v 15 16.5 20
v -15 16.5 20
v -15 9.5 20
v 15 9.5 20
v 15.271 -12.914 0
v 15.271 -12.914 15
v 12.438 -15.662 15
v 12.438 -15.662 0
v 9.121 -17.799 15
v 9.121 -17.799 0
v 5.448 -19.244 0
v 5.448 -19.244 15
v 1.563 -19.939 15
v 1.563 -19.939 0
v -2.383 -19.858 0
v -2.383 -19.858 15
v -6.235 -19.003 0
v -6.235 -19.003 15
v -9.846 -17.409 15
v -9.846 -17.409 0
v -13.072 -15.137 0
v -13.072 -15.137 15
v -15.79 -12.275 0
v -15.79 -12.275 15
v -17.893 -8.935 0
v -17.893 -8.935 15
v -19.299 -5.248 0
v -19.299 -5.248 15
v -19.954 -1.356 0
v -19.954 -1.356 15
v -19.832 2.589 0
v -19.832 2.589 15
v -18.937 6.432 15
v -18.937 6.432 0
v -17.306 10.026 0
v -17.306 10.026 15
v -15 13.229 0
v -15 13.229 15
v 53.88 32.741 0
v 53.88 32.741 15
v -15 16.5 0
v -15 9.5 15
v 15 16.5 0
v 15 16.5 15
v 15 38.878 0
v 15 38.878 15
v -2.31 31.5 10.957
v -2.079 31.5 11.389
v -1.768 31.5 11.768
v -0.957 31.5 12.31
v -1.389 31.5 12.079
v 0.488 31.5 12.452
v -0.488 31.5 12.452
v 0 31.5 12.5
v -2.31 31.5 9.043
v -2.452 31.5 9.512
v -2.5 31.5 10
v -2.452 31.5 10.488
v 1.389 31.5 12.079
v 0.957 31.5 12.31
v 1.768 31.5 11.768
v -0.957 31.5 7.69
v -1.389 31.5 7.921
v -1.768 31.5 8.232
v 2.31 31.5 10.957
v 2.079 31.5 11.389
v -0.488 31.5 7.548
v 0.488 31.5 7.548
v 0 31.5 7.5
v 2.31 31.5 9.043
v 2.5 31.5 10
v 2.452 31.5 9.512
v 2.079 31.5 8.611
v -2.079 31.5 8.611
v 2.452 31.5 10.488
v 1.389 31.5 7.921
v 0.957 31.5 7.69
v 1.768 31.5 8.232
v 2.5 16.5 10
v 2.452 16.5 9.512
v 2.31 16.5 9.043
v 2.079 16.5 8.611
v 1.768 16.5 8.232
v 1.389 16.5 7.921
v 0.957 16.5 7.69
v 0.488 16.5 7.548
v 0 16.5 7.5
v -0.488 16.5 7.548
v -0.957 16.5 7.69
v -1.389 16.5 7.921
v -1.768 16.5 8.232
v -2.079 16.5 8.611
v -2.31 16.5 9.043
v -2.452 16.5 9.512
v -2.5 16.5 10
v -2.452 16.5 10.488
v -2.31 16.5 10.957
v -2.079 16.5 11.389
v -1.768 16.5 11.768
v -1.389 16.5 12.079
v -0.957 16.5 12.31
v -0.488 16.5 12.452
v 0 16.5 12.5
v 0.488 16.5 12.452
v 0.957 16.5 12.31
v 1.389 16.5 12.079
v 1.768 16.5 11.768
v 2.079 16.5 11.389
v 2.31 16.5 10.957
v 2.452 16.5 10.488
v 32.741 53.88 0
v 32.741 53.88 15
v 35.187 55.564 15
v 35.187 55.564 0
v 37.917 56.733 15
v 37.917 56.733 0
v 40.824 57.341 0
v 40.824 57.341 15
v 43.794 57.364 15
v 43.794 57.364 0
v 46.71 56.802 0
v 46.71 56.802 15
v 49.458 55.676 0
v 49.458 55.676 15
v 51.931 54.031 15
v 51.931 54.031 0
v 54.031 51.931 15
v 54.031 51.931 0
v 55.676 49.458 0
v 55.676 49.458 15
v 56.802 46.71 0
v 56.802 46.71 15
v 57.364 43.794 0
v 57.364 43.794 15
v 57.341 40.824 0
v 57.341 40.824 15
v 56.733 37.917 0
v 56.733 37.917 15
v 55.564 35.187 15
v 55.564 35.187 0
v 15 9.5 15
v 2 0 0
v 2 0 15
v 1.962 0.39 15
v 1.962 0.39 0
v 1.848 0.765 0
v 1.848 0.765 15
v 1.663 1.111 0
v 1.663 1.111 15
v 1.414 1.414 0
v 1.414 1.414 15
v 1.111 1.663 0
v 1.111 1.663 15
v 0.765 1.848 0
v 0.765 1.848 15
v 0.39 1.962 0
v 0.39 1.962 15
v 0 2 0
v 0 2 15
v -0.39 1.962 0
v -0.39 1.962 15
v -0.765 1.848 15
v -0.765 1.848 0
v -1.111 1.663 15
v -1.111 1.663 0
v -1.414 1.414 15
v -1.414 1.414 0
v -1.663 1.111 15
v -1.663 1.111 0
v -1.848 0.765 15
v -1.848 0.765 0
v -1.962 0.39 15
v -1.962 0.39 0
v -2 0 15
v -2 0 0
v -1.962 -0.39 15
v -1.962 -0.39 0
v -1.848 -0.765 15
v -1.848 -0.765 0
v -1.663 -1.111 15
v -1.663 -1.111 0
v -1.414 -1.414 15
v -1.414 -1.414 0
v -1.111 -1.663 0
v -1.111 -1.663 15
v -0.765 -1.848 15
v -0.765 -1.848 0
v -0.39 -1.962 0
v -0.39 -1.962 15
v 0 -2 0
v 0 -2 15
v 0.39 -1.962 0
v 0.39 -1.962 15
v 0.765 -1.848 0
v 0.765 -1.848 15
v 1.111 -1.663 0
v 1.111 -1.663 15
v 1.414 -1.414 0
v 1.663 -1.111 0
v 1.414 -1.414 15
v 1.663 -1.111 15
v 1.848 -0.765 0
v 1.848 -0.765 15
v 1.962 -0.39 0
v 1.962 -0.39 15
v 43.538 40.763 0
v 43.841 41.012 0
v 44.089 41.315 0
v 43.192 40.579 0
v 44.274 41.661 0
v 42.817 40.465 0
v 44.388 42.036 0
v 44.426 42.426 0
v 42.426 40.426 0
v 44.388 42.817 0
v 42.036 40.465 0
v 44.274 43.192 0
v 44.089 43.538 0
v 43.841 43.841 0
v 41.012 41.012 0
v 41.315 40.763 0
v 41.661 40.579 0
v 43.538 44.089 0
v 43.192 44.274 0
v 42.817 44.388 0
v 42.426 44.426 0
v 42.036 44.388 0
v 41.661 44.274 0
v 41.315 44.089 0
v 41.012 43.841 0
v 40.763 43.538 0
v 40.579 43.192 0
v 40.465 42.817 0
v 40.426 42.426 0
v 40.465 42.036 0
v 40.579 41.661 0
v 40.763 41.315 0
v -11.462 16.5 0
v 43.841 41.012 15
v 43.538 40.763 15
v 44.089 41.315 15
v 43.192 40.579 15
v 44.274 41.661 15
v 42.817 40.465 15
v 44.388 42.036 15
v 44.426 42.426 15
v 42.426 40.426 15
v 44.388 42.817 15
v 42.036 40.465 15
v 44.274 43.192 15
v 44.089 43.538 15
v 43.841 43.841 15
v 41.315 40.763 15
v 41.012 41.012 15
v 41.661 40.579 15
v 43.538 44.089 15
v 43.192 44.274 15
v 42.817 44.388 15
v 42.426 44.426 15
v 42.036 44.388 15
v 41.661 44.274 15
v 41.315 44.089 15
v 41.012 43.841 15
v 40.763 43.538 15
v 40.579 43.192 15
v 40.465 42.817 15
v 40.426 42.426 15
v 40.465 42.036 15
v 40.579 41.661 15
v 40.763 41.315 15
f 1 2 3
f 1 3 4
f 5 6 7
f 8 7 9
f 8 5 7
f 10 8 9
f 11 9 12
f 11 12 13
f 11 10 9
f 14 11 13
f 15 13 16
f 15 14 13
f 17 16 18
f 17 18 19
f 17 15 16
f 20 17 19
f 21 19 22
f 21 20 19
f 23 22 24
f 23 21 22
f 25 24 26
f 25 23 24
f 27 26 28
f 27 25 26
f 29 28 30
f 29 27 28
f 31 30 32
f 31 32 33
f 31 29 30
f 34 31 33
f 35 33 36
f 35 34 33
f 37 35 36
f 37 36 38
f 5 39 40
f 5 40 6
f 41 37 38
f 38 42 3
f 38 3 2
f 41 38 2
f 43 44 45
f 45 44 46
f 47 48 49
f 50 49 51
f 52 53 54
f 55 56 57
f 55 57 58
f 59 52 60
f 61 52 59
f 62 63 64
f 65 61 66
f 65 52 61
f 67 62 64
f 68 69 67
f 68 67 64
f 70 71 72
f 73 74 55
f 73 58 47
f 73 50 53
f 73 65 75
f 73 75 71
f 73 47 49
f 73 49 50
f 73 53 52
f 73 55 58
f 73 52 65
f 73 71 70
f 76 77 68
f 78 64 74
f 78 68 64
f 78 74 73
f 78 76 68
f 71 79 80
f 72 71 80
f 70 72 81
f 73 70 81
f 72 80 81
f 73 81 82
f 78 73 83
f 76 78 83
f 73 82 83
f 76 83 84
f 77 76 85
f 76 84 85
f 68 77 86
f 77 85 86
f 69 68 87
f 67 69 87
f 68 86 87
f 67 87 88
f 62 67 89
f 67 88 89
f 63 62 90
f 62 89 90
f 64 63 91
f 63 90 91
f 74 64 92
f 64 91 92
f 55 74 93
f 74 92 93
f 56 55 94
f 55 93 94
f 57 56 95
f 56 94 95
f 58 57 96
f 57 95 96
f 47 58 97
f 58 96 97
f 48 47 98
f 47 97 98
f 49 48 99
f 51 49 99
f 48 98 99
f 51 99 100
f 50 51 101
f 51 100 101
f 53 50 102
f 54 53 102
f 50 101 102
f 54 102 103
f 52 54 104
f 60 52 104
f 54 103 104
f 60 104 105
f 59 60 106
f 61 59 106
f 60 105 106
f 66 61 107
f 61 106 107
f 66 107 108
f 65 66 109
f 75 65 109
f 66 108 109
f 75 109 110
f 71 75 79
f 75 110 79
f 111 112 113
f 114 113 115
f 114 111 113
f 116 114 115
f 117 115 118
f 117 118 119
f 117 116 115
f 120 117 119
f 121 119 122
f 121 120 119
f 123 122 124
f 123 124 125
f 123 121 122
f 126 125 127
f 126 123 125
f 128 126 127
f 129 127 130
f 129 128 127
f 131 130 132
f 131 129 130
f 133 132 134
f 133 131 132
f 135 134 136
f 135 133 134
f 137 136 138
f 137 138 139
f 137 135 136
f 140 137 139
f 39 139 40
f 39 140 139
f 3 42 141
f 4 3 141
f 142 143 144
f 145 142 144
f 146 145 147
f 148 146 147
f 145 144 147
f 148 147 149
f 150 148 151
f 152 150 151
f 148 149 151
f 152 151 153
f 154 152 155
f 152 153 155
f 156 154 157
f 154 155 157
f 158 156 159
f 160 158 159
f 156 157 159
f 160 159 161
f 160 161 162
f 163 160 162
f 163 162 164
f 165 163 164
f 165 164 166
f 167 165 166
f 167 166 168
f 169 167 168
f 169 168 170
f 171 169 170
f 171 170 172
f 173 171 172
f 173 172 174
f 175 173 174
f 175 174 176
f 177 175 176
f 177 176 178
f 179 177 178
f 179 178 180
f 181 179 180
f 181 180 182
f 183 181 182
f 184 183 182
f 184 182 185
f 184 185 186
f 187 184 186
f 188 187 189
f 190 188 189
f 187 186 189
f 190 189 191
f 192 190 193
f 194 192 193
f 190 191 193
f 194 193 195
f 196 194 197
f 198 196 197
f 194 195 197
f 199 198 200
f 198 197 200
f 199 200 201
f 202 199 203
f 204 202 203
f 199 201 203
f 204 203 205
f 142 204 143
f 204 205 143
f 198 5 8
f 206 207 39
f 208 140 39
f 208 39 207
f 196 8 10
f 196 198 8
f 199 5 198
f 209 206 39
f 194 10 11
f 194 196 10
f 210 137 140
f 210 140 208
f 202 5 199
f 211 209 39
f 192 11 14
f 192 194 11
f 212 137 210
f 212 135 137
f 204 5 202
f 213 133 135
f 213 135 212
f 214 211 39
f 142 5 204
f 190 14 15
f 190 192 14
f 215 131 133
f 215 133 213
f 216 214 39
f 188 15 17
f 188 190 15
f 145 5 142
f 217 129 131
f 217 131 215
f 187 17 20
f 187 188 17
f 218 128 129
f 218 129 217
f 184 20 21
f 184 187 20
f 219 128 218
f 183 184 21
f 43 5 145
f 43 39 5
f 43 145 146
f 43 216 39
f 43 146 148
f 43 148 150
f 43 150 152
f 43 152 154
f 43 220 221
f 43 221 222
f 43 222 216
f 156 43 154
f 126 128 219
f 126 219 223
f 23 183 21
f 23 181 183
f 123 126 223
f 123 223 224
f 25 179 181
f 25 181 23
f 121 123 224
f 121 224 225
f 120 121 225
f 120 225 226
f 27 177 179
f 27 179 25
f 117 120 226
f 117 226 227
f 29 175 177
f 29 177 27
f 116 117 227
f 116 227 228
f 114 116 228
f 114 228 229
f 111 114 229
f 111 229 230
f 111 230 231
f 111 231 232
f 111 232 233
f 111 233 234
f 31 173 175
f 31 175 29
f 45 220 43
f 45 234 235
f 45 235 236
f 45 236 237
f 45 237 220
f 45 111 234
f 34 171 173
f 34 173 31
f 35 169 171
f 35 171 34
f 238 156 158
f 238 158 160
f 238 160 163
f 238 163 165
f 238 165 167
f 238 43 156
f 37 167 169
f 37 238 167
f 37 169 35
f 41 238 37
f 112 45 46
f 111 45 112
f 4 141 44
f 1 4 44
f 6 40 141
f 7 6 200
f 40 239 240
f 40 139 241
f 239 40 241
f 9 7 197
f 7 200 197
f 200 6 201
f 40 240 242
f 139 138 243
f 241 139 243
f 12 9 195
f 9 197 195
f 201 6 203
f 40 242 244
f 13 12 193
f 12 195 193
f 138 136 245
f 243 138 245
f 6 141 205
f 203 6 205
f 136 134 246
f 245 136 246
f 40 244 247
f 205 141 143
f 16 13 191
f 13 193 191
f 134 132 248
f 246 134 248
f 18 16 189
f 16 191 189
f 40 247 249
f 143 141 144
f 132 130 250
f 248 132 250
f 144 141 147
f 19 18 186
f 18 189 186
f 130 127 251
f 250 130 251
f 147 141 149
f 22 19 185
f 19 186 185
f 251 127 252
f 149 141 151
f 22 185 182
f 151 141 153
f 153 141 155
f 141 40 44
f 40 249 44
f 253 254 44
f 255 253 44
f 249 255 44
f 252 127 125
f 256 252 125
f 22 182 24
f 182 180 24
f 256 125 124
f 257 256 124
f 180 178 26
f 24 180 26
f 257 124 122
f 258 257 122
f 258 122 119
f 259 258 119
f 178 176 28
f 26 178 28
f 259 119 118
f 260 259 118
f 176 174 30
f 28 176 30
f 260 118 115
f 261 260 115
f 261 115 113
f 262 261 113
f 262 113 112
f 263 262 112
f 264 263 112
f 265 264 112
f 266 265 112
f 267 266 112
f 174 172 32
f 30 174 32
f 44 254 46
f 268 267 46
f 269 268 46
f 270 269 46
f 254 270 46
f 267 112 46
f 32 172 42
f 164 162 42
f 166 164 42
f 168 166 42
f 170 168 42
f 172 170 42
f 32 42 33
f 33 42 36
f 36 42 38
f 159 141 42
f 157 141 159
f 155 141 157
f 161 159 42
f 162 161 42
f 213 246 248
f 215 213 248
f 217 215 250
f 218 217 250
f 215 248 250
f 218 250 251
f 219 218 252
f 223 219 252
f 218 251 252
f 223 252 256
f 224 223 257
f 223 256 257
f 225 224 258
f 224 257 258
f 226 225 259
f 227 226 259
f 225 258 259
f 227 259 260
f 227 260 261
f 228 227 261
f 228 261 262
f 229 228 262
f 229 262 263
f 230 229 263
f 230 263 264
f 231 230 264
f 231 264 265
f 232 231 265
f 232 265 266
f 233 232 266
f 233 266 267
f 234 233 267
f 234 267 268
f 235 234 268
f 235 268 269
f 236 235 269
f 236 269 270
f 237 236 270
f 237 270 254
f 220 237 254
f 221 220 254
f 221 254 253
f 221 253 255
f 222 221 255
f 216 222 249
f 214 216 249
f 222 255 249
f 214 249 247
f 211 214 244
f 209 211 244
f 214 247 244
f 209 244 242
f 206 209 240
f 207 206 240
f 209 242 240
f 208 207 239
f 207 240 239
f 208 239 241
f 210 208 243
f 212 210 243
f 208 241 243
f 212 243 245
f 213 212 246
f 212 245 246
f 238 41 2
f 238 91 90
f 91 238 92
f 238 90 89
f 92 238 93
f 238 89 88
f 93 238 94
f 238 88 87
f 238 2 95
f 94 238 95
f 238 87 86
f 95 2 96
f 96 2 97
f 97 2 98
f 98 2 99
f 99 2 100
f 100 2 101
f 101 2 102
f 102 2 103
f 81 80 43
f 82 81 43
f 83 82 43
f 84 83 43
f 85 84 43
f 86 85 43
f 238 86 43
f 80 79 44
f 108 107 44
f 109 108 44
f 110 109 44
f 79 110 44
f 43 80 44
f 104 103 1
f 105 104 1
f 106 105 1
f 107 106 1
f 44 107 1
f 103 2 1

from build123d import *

# Parameters (mm, degrees)
BOSS_EXTRUDE1_DEPTH      = 15
SKETCH2_R                = 2
CUT_EXTRUDE1_DEPTH       = 1
CUT_EXTRUDE1_DEPTH_BACK  = 16
SKETCH3_W                = 30
SKETCH3_H                = 7
BOSS_EXTRUDE2_DEPTH      = 5
BOSS_EXTRUDE2_DEPTH_BACK = 15
SKETCH4_W                = 38.205528846
SKETCH4_H                = 30.397050351
CUT_EXTRUDE2_DEPTH       = 6
CUT_EXTRUDE2_DEPTH_BACK  = 16
SKETCH5_R                = 2.5
BOSS_EXTRUDE3_DEPTH      = 15


with BuildPart() as part:
    # Sketch1 → Boss-Extrude1 (new body)
    with BuildSketch(Plane.XY):
        with BuildLine():
            Line((-12.914434136, 15.27145674), (32.740581269, 53.879999426))
            ThreePointArc((32.740581269, 53.879999426), (53.033008589, 53.033008589), (53.879999426, 32.740581269))
            Line((53.879999426, 32.740581269), (15.27145674, -12.914434136))
            ThreePointArc((15.27145674, -12.914434136), (-14.142135624, -14.142135624), (-12.914434136, 15.27145674))
        make_face()
    extrude(amount=BOSS_EXTRUDE1_DEPTH)

    # Sketch2 → Cut-Extrude1 (cut, two sides)
    with BuildSketch(Plane.XY.offset(15)) as cut_extrude1_sk:
        Circle(SKETCH2_R)
        with Locations((42.426406871, 42.426406871)):
            Circle(SKETCH2_R)
    extrude(amount=CUT_EXTRUDE1_DEPTH, mode=Mode.SUBTRACT)
    extrude(cut_extrude1_sk.sketch, amount=-CUT_EXTRUDE1_DEPTH_BACK, mode=Mode.SUBTRACT)

    # Sketch3 → Boss-Extrude2 (add, two sides)
    with BuildSketch(Plane.XY.offset(15)) as boss_extrude2_sk:
        with Locations((0, 13)):
            Rectangle(SKETCH3_W, SKETCH3_H)
    extrude(amount=BOSS_EXTRUDE2_DEPTH)
    extrude(boss_extrude2_sk.sketch, amount=-BOSS_EXTRUDE2_DEPTH_BACK)

    # Sketch4 → Cut-Extrude2 (cut, two sides)
    with BuildSketch(Plane.XY.offset(15)) as cut_extrude2_sk:
        with Locations((-4.102764423, 31.698525176)):
            Rectangle(SKETCH4_W, SKETCH4_H)
    extrude(amount=CUT_EXTRUDE2_DEPTH, mode=Mode.SUBTRACT)
    extrude(cut_extrude2_sk.sketch, amount=-CUT_EXTRUDE2_DEPTH_BACK, mode=Mode.SUBTRACT)

    # Sketch5 → Boss-Extrude3 (add)
    with BuildSketch(Plane(origin=(0, 16.5, 0), x_dir=(1, 0, 0), z_dir=(0, 1, 0))):
        with Locations((0, -10)):
            Circle(SKETCH5_R)
    extrude(amount=BOSS_EXTRUDE3_DEPTH)


solid = part.part
